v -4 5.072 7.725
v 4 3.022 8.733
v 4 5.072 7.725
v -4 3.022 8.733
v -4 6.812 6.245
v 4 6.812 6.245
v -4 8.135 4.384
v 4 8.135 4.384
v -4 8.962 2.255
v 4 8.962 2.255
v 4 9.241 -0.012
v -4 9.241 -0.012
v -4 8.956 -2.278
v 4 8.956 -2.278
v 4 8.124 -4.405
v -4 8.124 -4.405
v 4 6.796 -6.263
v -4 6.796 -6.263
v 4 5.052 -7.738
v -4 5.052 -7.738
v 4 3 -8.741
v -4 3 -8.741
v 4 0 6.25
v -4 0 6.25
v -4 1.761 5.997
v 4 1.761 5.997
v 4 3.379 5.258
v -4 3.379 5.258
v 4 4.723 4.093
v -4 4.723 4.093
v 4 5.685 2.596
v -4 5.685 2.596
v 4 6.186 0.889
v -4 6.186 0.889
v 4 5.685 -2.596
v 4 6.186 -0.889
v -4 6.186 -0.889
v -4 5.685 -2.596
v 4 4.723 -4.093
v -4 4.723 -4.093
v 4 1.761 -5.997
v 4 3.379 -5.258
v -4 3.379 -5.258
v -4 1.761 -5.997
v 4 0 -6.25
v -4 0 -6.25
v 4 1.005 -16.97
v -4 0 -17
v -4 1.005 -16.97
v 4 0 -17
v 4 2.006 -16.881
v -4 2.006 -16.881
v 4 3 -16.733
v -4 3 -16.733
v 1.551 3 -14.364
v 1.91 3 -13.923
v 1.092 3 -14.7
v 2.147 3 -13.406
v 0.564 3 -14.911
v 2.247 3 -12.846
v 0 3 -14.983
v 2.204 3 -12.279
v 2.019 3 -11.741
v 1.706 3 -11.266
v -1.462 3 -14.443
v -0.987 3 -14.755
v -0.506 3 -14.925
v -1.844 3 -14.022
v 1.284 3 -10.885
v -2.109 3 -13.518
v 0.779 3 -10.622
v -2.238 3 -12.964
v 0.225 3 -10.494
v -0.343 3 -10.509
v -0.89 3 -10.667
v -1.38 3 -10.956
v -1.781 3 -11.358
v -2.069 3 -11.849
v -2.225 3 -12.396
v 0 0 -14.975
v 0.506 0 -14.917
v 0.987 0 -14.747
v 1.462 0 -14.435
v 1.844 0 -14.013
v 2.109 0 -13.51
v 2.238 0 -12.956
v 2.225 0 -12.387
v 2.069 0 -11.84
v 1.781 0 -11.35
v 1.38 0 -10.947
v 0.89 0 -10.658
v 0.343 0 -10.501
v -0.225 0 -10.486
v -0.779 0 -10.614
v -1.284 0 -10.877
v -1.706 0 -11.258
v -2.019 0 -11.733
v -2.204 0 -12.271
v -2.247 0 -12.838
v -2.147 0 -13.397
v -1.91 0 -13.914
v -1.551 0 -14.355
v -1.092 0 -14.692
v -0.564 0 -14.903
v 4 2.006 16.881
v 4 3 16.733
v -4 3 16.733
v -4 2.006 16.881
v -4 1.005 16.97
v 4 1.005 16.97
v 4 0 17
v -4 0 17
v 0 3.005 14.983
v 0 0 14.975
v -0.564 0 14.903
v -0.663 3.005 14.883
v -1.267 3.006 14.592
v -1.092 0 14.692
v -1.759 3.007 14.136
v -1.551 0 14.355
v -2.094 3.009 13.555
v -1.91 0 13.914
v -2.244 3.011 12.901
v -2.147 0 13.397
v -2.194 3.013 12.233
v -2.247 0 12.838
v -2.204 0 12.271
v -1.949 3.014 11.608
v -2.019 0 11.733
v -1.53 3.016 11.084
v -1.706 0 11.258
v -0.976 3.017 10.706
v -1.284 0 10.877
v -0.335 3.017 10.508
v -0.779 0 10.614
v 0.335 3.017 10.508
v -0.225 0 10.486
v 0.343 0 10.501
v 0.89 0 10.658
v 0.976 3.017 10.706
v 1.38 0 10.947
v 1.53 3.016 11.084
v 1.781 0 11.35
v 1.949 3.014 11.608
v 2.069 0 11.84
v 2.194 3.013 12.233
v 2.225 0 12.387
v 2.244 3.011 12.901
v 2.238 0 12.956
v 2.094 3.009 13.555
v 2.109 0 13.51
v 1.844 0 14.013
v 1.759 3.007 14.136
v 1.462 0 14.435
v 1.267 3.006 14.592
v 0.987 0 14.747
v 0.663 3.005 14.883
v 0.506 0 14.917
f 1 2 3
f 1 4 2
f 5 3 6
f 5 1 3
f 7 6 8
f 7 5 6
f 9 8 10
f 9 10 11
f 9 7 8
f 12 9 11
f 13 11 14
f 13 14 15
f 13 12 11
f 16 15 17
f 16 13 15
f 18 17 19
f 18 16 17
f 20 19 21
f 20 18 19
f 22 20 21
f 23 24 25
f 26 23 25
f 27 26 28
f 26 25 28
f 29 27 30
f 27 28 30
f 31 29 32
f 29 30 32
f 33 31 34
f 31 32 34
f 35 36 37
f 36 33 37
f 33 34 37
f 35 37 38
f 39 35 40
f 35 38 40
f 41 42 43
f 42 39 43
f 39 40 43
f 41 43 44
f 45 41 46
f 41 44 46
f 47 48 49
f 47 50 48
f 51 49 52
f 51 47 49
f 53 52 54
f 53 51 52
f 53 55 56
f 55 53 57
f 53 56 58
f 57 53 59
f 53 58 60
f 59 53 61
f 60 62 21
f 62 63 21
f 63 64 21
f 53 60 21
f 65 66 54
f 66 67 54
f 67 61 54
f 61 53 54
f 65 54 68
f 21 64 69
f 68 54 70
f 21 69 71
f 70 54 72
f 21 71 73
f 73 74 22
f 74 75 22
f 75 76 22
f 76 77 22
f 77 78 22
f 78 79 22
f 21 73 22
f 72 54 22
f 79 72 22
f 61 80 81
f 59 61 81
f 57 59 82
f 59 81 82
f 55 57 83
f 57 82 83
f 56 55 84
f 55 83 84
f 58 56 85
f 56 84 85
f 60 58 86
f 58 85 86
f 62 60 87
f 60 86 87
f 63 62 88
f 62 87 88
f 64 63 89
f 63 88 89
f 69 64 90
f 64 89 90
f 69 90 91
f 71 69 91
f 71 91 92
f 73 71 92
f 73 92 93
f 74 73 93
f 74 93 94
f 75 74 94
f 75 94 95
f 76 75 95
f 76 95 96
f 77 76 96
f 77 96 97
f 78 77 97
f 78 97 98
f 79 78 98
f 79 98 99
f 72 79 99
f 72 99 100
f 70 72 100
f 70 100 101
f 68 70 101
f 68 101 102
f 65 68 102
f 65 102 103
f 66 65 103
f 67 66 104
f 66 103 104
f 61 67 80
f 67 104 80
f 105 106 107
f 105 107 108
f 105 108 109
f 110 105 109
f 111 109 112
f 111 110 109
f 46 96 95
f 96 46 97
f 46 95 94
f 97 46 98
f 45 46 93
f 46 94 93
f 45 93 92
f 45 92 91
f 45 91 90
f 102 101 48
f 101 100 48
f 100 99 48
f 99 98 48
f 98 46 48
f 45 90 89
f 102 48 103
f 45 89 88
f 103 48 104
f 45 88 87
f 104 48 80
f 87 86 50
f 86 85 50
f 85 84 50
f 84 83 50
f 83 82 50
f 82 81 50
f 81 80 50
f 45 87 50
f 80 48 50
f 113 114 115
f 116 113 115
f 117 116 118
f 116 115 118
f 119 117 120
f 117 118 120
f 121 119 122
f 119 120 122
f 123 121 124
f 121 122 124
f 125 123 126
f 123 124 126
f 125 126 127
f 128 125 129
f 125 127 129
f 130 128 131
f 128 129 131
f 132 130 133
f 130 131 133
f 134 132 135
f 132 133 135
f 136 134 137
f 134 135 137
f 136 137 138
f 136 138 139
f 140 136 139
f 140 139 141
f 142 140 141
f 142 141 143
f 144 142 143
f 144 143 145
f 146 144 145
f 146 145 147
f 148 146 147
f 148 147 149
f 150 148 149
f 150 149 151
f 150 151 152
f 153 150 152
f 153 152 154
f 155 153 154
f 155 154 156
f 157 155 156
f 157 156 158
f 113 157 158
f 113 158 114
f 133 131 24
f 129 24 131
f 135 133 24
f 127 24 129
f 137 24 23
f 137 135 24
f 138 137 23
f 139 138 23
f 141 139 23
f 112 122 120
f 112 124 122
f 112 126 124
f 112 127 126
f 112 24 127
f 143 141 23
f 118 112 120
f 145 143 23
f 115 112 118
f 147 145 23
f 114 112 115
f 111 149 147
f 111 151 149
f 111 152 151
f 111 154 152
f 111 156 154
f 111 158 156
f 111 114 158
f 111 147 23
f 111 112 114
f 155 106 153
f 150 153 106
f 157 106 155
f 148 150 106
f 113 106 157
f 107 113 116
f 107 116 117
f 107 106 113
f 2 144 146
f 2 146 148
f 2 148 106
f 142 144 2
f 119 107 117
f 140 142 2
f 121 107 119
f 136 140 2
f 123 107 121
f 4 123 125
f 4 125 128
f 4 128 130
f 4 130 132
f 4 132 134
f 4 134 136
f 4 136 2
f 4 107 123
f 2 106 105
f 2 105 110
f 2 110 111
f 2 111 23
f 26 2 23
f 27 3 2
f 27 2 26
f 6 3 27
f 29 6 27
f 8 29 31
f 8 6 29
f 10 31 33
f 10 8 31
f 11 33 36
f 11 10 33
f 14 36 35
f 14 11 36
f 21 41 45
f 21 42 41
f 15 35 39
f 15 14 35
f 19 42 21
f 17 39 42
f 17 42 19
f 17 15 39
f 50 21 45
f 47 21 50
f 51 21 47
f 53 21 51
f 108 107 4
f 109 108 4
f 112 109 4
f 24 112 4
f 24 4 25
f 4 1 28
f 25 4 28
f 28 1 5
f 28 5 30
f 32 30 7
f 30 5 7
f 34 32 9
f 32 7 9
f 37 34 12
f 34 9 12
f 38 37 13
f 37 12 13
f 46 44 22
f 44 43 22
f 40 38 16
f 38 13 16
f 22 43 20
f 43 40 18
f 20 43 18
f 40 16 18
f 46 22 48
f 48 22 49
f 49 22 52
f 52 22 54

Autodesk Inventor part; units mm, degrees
ref_plane "YZ Plane" through (0, 0, 0) normal (1, 0, 0) x (0, 1, 0)
ref_plane "XZ Plane" through (0, 0, 0) normal (0, 1, 0) x (-1, 0, 0)
ref_plane "XY Plane" through (0, 0, 0) normal (0, 0, 1) x (1, 0, 0)
sketch "スケッチ1" plane through (0, 0, 0) normal (0, 0, 1) x (1, 0, 0)
  line L0 (-5.6, 0) -> (5.6, 0) projected
  line L1 (0, 0) -> (0, 6.25) construction
  line L2 (0, 6.25) -> (-4, 6.25)
  line L3 (-4, 6.25) -> (-4, 17)
  line L4 (-4, 17) -> (0, 17)
  line L5 (0, 6.25) -> (4, 6.25)
  line L6 (4, 6.25) -> (4, 17)
  line L7 (4, 17) -> (0, 17)
  dimension "d32" = 6.25
  dimension "d33" = 4
  dimension "d34" = 10.75
revolve "回転1" add sketch "スケッチ1" angle 180 mid plane about axis through (-10, 0, 0) along (1, 0, 0)
sketch "スケッチ5" plane through (-4, 0, -17) normal (-1, 0, 0) x (0, 0, 1)
  line L0 (17, 0) -> (17, 3) construction
  arc A0 (25.7409, 3) -> (8.2591, 3) centre (17, 0) ccw
  arc A1 (33.7332, 3) -> (0.2668, 3) centre (17, 0) ccw
  line L1 (0.2668, 3) -> (8.2668, 3)
  line L2 (33.7332, 3) -> (25.7332, 3.0224)
  circle A2 centre (17, 0) radius 9.2341
  point P0 (8.2591, 3)
  dimension "d35" = 3
  dimension "d49" = 8
  dimension "d50" = 8
extrude "押し出し2" cut sketch "スケッチ5" against normal through all contours A0 L1 A1 L2
sketch "スケッチ7" plane through (-4, 3.0224, 8.7332) normal (0, 1, 0.0028) x (1, 0, 0)
  line L0 (8, -8) -> (0, -8) projected
  line L1 (0, -8) -> (0, 0) projected
  point P0 (4, 8.7247)
  point P1 (4, -4)
  dimension "d51" = 4
  dimension "d52" = 4
hole "穴4" at (0, 3.0112, 12.7332) direction (0, -1, -0.0028) diameter 4.5 end through all
mirror "ミラー3" about plane through (0, 0, 0) normal (0, 0, 1) of "穴4"
properties part number "probe-cover-clump" material "ステンレス鋼"
